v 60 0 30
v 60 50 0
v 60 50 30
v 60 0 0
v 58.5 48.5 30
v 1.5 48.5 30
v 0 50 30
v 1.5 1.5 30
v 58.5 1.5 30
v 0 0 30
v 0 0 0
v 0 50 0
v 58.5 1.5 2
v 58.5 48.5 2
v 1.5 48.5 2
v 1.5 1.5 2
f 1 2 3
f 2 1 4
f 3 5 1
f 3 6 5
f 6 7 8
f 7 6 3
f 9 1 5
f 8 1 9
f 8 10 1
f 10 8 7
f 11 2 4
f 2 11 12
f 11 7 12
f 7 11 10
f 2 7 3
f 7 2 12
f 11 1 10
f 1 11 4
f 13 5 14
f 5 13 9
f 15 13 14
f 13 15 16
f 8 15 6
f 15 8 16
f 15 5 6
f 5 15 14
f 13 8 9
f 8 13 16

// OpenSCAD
$fn = 32;

// ----------------------------------------------------------------------
// Open box: 1.5 mm walls
// ----------------------------------------------------------------------

// --- parameters (mm) ---
box_l = 60;               // outer length, X
box_w = 50;               // outer width, Y
box_h = 30;               // outer height, Z
wall = 1.5;               // wall thickness
floor = 2;                // floor thickness

difference() {
  cube([box_l, box_w, box_h]);
  translate([wall, wall, floor])
    cube([box_l - 2 * wall, box_w - 2 * wall, box_h]);
}
